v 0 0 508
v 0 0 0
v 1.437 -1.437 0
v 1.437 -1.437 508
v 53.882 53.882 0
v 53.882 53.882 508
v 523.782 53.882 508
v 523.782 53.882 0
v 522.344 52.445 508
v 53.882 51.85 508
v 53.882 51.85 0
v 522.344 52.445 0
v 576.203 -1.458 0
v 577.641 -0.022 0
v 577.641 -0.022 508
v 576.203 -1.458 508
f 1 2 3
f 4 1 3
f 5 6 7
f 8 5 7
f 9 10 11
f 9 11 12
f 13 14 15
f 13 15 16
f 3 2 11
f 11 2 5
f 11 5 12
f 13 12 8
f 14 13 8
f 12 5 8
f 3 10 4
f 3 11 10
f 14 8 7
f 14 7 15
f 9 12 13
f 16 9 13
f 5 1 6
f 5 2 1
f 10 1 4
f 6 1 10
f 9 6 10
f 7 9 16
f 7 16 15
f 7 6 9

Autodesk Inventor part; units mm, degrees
ref_plane "YZ Plane" through (0, 0, 0) normal (1, 0, 0) x (0, 1, 0)
ref_plane "XZ Plane" through (0, 0, 0) normal (0, 1, 0) x (-1, 0, 0)
ref_plane "XY Plane" through (0, 0, 0) normal (0, 0, 1) x (1, 0, 0)
sketch "Sketch1" plane through (0, 0, 0) normal (0, 0, 1) x (1, 0, 0)
  line L0 (0, 0) -> (53.8815, 53.8815)
  line L1 (0, 0) -> (76.2, 0) construction
  line L2 (0, 0) -> (1.4368, -1.4368)
  line L3 (53.8815, 53.8815) -> (523.7815, 53.8815) construction
  line L4 (523.7815, 53.8815) -> (577.6409, -0.0222)
  line L5 (577.6409, -0.0222) -> (576.2034, -1.4585)
  line L6 (523.7815, 53.8815) -> (525.8135, 53.8815) construction
  line L7 (522.3441, 52.4453) -> (576.2034, -1.4585)
  line L8 (53.8815, 51.8495) -> (1.4368, -1.4368)
  line L9 (53.8815, 51.8495) -> (522.3441, 52.4453)
  line L10 (53.8815, 53.8815) -> (523.7815, 53.8815)
  dimension "d0" = 76.2
  dimension "d1" = 45
  dimension "d2" = 2.032
  dimension "d5" = 76.2
  dimension "d6" = 2.032
  dimension "d7" = 2.032
  dimension "d9" = 2.032
extrude "Extrusion1" add sketch "Sketch1" along normal blind 508
properties part number "LoadSlide" material "Polycarbonate, Clear"
